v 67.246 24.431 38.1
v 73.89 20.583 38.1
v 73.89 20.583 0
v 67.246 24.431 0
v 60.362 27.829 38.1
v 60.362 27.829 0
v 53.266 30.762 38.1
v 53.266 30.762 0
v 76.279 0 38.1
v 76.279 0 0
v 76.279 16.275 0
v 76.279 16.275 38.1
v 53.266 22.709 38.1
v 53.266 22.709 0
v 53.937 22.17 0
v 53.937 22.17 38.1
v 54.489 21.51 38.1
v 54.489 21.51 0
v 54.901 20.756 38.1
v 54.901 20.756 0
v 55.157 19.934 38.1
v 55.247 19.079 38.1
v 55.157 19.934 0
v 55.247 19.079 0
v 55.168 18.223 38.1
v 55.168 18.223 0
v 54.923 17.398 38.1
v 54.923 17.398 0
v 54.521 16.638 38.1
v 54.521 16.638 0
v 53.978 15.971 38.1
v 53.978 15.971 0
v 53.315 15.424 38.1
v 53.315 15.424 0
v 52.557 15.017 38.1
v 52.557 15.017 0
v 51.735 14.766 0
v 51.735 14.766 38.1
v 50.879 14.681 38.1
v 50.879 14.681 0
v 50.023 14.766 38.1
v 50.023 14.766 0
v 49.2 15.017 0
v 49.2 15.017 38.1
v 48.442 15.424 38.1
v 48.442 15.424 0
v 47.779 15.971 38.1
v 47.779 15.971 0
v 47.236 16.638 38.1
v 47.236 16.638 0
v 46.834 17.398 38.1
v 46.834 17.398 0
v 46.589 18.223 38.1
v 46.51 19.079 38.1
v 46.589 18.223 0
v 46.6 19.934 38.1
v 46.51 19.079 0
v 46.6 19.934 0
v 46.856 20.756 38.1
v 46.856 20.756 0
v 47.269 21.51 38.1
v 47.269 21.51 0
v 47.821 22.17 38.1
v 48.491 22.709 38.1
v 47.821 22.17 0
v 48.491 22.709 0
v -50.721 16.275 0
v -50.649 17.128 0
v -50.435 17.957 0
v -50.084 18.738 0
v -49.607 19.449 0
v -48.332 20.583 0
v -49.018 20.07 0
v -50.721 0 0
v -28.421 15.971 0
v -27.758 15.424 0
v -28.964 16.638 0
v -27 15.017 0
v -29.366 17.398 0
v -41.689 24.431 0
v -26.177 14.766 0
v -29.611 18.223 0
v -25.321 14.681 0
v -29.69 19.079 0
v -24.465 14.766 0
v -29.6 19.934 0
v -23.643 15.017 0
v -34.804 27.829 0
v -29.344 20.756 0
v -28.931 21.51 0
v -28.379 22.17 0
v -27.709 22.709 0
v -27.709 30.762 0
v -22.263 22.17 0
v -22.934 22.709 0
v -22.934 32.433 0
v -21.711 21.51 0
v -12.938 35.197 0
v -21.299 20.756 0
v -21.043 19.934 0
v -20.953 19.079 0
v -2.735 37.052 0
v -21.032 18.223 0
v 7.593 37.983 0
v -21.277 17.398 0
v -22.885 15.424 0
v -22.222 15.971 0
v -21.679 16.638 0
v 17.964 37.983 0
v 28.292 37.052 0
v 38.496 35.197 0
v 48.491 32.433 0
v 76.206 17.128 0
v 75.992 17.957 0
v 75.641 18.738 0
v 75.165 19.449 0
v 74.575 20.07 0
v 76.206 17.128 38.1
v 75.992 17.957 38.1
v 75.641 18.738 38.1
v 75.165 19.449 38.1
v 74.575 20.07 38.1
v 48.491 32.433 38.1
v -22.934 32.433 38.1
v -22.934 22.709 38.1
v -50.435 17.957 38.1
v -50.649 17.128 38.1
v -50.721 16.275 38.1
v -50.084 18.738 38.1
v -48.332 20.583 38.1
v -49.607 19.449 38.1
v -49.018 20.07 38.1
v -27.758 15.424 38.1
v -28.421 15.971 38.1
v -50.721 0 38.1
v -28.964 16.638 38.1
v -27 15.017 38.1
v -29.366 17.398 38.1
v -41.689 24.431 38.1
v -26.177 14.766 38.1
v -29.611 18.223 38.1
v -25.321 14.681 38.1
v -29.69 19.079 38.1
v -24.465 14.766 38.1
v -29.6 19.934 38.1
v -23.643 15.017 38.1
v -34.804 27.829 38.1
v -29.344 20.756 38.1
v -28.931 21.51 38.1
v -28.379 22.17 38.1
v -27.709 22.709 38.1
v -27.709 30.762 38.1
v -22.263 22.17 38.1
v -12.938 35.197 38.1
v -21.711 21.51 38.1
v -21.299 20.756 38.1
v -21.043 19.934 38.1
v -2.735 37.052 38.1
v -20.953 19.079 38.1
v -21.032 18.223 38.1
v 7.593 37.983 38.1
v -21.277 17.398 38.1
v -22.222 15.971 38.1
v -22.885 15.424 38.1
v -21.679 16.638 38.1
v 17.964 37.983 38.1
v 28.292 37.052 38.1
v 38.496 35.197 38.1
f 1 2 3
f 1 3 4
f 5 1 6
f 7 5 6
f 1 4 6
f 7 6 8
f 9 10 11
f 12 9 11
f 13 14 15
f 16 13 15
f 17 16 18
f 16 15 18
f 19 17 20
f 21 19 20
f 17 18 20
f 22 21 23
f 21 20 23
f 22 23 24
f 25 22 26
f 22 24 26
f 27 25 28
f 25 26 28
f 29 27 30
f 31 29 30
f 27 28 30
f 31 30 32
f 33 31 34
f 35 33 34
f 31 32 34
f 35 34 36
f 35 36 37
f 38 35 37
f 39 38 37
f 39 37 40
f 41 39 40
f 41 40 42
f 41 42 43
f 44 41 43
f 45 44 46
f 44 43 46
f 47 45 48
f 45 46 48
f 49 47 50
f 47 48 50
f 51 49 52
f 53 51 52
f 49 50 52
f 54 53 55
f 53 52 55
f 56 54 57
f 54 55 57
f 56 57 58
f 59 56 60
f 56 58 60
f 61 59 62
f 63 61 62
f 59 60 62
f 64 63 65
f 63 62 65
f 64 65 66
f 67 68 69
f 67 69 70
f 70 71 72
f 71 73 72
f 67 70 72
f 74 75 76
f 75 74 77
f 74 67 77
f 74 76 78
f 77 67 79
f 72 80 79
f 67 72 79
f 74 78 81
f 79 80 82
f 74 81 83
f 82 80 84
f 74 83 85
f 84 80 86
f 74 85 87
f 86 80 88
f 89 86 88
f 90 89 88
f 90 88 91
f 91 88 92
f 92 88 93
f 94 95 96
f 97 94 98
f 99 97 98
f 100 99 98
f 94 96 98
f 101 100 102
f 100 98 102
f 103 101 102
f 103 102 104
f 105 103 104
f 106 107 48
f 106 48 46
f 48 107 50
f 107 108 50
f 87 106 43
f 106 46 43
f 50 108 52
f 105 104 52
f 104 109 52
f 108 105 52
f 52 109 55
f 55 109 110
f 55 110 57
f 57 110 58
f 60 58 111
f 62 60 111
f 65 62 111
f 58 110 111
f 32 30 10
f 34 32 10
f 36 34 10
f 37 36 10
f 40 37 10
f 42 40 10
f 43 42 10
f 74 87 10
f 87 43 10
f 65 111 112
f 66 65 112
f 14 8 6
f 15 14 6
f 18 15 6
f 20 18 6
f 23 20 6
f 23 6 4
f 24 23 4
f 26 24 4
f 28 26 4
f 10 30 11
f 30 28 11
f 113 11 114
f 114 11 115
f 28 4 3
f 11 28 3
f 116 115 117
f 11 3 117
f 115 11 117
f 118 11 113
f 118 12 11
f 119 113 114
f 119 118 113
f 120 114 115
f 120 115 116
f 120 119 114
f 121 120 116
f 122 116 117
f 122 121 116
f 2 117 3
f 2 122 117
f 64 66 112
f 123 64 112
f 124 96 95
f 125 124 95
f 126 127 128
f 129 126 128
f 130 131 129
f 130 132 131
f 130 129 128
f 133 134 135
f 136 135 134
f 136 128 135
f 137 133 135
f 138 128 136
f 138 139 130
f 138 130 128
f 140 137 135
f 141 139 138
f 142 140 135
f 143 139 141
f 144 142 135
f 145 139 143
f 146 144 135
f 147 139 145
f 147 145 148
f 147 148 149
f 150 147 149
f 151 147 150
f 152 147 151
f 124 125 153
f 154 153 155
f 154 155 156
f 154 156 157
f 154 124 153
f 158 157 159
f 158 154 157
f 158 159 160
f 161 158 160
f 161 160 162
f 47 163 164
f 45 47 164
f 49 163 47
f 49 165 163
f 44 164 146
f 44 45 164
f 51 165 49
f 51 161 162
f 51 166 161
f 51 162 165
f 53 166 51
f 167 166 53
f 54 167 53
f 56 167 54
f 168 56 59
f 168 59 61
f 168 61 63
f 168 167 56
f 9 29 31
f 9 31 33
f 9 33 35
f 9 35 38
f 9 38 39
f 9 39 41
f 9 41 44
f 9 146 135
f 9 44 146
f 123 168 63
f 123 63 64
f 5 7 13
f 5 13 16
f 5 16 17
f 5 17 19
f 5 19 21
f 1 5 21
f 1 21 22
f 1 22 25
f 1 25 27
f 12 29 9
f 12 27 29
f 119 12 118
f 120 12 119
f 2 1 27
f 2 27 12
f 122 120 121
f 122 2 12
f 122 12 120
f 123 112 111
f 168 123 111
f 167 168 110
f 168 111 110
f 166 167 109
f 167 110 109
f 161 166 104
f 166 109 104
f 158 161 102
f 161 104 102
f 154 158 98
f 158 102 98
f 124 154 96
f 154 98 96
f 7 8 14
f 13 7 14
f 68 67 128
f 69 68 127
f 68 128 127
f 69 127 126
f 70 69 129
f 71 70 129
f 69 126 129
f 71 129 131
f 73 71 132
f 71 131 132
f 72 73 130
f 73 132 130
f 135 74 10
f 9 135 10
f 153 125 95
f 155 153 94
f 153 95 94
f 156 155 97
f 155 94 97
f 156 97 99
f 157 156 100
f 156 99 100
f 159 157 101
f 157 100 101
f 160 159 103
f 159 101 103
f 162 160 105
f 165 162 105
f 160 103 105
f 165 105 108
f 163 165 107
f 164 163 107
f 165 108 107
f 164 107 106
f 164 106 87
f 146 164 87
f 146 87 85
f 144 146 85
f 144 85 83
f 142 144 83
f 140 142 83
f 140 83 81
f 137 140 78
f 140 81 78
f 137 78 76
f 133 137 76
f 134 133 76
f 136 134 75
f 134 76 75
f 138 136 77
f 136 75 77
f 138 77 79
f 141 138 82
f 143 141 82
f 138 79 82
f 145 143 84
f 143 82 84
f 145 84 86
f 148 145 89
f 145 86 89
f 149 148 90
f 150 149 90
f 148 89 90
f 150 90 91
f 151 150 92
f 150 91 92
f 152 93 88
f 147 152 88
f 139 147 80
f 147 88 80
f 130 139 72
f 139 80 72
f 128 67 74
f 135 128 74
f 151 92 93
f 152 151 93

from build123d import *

# Parameters (mm, degrees)
F1_DEPTH = 38.1
F2_R     = 5.08
F3_R     = 5.08


with BuildPart() as f1:
    # F0 (on Top) → F1 (new body)
    with BuildSketch(Plane.XY):
        with BuildLine():
            Line((-50.721363, 19.05), (-50.721363, 0))
            Line((-50.721363, 0), (76.278637, 0))
            Line((76.278637, 0), (76.278637, 19.05))
            ThreePointArc((76.278637, 19.05), (65.101151, 25.551684), (53.266237, 30.761569))
            Line((53.266237, 30.761569), (53.266237, 22.708658))
            ThreePointArc((53.266237, 22.708658), (50.878637, 14.6812), (48.491037, 22.708658))
            Line((48.491037, 22.708658), (48.491037, 32.432913))
            ThreePointArc((48.491037, 32.432913), (12.778637, 38.1), (-22.933763, 32.432913))
            Line((-22.933763, 32.432913), (-22.933763, 22.708658))
            ThreePointArc((-22.933763, 22.708658), (-25.321363, 14.6812), (-27.708963, 22.708658))
            Line((-27.708963, 22.708658), (-27.708963, 30.761569))
            ThreePointArc((-27.708963, 30.761569), (-39.543877, 25.551684), (-50.721363, 19.05))
        make_face()
    extrude(amount=F1_DEPTH)

    # F2
    f2_edges = [f1.edges().sort_by_distance(p)[0] for p in [
        (-50.721363, 19.05, 19.05),
    ]]
    fillet(f2_edges, radius=F2_R)

    # F3
    f3_edges = [f1.edges().sort_by_distance(p)[0] for p in [
        (76.278637, 19.05, 19.05),
    ]]
    fillet(f3_edges, radius=F3_R)


solid = f1.part
